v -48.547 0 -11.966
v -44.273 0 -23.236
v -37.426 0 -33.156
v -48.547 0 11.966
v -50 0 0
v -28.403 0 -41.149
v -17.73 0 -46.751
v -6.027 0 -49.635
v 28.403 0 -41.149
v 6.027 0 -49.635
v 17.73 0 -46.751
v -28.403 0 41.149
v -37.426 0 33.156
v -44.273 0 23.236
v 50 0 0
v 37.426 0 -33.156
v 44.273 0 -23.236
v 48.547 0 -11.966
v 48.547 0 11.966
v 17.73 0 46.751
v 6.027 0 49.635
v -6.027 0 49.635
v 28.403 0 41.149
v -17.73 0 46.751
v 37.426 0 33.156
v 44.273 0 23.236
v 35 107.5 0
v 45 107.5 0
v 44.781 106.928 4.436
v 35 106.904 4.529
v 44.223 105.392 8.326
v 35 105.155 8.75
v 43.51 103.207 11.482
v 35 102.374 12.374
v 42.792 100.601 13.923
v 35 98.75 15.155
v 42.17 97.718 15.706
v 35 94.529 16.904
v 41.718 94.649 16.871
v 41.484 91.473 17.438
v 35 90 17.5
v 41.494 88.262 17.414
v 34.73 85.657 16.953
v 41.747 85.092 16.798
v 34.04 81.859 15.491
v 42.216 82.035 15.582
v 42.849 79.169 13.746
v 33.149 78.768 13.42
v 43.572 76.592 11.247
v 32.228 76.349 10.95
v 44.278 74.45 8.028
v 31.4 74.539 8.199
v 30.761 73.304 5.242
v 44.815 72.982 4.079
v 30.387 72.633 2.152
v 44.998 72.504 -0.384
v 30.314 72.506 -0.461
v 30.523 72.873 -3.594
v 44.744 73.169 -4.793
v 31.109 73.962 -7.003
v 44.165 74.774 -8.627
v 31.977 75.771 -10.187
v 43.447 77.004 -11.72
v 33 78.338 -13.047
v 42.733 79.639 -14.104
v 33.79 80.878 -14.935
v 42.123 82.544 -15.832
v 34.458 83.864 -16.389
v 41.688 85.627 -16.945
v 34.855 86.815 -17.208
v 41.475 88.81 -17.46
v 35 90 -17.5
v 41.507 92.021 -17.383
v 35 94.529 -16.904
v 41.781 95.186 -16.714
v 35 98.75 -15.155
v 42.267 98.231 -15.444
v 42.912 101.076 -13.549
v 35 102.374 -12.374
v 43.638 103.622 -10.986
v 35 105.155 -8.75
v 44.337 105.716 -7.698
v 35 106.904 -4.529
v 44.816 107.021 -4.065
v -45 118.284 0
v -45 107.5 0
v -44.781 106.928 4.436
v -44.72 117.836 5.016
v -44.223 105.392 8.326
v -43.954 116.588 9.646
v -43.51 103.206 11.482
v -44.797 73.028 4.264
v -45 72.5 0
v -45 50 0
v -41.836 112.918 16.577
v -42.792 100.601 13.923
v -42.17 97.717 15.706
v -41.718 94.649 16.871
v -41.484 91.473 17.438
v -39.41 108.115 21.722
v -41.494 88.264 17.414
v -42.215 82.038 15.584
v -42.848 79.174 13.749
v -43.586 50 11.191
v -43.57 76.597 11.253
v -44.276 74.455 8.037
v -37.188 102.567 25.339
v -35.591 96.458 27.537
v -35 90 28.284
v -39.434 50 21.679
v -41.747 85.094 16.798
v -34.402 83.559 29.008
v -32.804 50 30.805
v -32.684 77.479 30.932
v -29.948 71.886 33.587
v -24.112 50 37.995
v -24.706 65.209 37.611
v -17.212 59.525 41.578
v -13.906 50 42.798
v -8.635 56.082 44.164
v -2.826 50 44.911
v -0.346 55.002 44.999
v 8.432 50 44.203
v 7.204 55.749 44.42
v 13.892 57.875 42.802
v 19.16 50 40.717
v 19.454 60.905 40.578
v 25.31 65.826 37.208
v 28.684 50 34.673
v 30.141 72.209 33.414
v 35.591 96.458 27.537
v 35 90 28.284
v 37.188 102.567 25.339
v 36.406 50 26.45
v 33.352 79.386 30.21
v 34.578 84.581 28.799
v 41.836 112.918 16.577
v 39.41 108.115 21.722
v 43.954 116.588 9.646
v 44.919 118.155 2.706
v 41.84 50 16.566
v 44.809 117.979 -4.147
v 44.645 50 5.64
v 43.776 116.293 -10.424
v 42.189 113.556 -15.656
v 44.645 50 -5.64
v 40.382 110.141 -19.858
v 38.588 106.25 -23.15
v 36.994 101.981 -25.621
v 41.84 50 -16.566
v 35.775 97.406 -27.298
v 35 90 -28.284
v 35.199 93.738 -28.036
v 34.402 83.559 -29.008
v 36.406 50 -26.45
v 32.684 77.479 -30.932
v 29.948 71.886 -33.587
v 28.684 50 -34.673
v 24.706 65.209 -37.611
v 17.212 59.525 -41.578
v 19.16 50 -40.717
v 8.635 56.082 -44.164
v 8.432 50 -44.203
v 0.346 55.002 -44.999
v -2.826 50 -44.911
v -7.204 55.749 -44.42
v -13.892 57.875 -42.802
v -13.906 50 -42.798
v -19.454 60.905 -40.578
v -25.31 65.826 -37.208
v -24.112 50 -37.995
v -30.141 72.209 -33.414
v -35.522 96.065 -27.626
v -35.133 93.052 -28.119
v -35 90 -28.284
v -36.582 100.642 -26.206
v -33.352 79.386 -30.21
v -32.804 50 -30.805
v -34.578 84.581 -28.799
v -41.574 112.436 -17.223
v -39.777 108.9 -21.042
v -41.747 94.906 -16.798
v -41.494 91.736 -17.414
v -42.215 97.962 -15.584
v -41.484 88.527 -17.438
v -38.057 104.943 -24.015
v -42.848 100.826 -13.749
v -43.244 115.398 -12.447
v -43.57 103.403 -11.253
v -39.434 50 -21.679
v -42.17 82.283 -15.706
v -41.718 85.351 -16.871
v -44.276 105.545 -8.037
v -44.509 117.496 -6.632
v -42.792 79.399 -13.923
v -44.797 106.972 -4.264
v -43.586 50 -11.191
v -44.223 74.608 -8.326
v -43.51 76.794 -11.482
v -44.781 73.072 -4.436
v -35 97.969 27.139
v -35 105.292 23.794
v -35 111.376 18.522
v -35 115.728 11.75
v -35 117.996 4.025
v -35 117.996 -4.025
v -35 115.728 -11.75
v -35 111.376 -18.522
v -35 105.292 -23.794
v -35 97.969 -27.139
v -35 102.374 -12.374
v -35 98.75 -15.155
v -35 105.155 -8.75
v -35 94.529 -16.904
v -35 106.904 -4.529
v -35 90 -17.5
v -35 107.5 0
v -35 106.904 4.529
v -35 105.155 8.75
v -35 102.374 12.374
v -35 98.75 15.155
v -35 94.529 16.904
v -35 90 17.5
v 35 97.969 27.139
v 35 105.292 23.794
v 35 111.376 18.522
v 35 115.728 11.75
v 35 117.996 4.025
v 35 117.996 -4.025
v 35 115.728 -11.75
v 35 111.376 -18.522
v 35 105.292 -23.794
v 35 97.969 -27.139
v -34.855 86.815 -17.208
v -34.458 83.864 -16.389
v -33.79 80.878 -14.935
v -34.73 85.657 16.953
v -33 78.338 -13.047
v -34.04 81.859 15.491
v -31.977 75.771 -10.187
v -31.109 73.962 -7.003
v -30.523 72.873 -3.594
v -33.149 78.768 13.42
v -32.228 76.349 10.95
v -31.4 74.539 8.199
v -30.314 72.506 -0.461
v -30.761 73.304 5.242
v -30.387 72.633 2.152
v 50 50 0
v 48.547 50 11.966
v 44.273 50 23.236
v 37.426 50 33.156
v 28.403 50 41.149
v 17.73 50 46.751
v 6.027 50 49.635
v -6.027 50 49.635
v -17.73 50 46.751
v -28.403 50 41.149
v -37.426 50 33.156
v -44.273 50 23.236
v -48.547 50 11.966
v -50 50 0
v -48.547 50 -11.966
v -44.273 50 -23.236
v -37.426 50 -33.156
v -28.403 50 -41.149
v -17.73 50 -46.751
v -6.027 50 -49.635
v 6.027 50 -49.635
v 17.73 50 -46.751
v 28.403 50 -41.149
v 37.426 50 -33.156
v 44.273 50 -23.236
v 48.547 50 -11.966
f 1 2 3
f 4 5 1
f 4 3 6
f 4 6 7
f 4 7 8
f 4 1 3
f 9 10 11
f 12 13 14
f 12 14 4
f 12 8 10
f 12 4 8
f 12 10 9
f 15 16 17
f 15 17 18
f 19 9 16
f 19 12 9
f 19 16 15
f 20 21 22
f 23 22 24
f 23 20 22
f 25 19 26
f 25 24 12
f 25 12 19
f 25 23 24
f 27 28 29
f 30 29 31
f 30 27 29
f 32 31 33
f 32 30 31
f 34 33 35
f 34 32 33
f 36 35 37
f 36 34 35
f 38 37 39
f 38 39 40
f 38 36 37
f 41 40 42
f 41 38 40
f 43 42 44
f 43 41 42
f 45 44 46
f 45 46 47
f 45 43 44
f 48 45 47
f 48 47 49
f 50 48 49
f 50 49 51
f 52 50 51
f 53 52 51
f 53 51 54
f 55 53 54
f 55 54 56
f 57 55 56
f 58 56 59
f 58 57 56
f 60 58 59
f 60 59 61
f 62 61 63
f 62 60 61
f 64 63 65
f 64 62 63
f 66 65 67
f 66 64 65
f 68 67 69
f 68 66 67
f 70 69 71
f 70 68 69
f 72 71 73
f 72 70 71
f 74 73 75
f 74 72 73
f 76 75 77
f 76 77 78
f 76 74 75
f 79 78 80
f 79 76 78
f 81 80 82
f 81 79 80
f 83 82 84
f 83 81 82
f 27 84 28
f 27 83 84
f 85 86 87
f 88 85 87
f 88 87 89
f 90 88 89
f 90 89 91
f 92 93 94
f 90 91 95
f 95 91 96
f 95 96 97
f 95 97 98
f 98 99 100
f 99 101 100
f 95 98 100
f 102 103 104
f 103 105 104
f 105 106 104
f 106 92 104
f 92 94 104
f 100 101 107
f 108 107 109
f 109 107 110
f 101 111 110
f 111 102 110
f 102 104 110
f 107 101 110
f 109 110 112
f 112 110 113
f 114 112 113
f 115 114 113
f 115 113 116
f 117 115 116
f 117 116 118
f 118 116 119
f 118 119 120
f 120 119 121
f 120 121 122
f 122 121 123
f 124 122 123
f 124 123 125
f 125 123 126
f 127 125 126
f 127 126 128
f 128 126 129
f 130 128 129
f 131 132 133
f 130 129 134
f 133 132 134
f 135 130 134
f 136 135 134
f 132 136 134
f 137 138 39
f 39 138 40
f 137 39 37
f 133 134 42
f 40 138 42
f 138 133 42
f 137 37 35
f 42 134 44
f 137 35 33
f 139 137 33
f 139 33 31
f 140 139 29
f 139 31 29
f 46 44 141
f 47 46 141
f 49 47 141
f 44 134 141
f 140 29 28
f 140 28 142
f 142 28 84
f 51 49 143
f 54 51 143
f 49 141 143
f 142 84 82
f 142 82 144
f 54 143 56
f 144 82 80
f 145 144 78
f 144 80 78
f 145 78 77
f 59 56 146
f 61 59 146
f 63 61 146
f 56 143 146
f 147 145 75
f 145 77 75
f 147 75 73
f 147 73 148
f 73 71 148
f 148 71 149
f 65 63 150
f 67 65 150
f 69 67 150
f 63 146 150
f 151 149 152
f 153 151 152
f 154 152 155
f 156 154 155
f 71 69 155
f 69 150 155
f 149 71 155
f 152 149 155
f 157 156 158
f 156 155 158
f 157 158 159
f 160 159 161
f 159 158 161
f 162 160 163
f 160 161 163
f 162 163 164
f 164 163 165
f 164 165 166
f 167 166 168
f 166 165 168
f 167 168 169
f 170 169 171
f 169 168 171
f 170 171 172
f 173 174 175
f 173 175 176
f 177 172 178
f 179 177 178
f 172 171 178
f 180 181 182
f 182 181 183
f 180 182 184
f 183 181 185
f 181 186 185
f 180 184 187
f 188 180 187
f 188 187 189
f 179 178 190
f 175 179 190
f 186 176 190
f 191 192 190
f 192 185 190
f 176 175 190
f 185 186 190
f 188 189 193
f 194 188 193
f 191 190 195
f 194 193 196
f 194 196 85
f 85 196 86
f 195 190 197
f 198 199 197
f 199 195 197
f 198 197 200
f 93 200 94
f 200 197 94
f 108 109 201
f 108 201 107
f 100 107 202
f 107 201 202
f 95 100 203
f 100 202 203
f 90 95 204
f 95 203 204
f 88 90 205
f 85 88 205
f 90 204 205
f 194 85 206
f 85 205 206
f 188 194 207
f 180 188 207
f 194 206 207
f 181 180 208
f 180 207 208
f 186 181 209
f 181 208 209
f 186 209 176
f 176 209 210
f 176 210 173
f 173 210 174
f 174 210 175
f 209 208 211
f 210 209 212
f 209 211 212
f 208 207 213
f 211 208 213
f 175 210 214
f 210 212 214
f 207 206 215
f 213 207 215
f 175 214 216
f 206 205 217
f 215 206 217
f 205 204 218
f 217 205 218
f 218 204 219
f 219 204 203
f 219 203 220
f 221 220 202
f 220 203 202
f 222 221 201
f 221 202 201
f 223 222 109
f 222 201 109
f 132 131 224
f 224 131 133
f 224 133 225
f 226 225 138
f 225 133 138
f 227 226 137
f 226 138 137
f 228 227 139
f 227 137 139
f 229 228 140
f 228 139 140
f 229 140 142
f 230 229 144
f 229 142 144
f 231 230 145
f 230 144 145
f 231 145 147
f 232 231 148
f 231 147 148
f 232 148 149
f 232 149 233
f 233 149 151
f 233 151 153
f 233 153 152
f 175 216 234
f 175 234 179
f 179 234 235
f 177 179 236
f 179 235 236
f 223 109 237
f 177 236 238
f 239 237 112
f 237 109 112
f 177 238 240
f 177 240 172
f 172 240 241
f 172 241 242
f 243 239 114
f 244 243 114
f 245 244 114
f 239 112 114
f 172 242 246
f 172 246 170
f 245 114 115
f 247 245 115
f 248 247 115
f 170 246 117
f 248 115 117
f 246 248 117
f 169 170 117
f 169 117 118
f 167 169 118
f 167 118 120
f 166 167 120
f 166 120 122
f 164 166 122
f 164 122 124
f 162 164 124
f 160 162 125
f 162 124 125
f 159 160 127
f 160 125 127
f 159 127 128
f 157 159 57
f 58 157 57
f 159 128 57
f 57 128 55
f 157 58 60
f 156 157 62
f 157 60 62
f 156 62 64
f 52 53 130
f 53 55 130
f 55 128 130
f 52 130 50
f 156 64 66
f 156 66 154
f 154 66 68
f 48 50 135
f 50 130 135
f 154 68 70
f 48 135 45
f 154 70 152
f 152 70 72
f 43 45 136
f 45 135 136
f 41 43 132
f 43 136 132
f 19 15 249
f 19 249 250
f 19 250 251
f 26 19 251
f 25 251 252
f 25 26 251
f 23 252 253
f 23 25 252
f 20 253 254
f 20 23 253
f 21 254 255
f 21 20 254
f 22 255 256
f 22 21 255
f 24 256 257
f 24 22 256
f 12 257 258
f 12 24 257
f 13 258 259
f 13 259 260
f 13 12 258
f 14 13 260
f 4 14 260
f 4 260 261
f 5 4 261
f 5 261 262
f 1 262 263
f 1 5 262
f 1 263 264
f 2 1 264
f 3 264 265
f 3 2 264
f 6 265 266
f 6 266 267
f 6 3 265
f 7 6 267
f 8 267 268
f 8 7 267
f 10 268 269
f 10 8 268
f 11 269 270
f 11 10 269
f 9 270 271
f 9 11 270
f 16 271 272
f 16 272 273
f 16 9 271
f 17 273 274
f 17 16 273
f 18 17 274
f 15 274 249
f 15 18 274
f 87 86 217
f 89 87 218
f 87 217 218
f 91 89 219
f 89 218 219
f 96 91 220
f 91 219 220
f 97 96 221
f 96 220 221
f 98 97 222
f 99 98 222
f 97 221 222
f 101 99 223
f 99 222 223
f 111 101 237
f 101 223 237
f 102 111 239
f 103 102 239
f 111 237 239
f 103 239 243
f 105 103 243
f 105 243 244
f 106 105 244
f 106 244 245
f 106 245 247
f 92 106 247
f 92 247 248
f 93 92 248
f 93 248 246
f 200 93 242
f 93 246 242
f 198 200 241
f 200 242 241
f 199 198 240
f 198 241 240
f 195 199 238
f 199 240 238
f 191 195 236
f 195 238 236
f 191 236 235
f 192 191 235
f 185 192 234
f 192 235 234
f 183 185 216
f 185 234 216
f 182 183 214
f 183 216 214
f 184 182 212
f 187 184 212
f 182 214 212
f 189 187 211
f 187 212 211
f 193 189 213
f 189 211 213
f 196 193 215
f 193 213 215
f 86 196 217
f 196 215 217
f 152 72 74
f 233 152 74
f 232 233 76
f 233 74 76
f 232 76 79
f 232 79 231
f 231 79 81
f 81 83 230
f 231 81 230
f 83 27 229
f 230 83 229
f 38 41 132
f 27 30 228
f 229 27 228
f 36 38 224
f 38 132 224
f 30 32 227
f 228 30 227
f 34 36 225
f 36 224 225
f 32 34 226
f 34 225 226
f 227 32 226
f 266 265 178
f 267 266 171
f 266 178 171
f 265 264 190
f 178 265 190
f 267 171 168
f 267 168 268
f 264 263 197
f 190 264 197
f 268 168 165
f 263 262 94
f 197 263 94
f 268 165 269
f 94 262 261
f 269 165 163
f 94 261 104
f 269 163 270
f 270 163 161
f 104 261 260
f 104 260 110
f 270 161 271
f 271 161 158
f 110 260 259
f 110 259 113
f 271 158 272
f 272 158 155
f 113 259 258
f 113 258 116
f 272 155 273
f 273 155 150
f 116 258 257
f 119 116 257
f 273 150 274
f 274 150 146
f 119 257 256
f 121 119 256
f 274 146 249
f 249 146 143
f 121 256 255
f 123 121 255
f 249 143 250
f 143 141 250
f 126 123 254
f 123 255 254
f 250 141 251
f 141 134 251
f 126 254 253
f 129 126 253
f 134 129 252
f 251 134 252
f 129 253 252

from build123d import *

# Parameters (mm, degrees)
F0_R     = 50
F1_DEPTH = 50
F2_R     = 45
F3_DEPTH = 80
F5_DEPTH = 100
F6_R     = 17.5
F7_DEPTH = 100


with BuildPart() as f1:
    # F0 (on Front) → F1 (new body)
    with BuildSketch(Plane.XZ):
        Circle(F0_R)
    extrude(amount=-F1_DEPTH)

    # F2 (on face) → F3 (join)
    with BuildSketch(Plane(origin=(0, 50, 0), x_dir=(-1, 0, 0), z_dir=(0, 1, 0))):
        Circle(F2_R)
    extrude(amount=F3_DEPTH)

    # F4 (on Top) → F5 (cut, symmetric)
    with BuildSketch(Plane.XY):
        with BuildLine():
            ThreePointArc((-35, 90), (0, 55), (35, 90))
            ThreePointArc((35, 90), (0, 125), (-35, 90))
        make_face()
        with BuildLine():
            ThreePointArc((-35, 90), (0, 125), (35, 90))
            Line((35, 90), (35, 130))
            Line((35, 130), (-35, 130))
            Line((-35, 130), (-35, 90))
        make_face()
    extrude(amount=F5_DEPTH, both=True, mode=Mode.SUBTRACT)

    # F6 (on face) → F7 (cut, symmetric)
    with BuildSketch(Plane.YZ.offset(-35)):
        with Locations((90, 0)):
            Circle(F6_R)
        with BuildLine():
            ThreePointArc((90, 28.2842712475), (118.2842712475, 0), (90, -28.2842712475))
            Line((90, -28.2842712475), (130, -28.2842712475))
            Line((130, -28.2842712475), (130, 28.2842712475))
            Line((130, 28.2842712475), (90, 28.2842712475))
        make_face()
    extrude(amount=F7_DEPTH, both=True, mode=Mode.SUBTRACT)


solid = f1.part
